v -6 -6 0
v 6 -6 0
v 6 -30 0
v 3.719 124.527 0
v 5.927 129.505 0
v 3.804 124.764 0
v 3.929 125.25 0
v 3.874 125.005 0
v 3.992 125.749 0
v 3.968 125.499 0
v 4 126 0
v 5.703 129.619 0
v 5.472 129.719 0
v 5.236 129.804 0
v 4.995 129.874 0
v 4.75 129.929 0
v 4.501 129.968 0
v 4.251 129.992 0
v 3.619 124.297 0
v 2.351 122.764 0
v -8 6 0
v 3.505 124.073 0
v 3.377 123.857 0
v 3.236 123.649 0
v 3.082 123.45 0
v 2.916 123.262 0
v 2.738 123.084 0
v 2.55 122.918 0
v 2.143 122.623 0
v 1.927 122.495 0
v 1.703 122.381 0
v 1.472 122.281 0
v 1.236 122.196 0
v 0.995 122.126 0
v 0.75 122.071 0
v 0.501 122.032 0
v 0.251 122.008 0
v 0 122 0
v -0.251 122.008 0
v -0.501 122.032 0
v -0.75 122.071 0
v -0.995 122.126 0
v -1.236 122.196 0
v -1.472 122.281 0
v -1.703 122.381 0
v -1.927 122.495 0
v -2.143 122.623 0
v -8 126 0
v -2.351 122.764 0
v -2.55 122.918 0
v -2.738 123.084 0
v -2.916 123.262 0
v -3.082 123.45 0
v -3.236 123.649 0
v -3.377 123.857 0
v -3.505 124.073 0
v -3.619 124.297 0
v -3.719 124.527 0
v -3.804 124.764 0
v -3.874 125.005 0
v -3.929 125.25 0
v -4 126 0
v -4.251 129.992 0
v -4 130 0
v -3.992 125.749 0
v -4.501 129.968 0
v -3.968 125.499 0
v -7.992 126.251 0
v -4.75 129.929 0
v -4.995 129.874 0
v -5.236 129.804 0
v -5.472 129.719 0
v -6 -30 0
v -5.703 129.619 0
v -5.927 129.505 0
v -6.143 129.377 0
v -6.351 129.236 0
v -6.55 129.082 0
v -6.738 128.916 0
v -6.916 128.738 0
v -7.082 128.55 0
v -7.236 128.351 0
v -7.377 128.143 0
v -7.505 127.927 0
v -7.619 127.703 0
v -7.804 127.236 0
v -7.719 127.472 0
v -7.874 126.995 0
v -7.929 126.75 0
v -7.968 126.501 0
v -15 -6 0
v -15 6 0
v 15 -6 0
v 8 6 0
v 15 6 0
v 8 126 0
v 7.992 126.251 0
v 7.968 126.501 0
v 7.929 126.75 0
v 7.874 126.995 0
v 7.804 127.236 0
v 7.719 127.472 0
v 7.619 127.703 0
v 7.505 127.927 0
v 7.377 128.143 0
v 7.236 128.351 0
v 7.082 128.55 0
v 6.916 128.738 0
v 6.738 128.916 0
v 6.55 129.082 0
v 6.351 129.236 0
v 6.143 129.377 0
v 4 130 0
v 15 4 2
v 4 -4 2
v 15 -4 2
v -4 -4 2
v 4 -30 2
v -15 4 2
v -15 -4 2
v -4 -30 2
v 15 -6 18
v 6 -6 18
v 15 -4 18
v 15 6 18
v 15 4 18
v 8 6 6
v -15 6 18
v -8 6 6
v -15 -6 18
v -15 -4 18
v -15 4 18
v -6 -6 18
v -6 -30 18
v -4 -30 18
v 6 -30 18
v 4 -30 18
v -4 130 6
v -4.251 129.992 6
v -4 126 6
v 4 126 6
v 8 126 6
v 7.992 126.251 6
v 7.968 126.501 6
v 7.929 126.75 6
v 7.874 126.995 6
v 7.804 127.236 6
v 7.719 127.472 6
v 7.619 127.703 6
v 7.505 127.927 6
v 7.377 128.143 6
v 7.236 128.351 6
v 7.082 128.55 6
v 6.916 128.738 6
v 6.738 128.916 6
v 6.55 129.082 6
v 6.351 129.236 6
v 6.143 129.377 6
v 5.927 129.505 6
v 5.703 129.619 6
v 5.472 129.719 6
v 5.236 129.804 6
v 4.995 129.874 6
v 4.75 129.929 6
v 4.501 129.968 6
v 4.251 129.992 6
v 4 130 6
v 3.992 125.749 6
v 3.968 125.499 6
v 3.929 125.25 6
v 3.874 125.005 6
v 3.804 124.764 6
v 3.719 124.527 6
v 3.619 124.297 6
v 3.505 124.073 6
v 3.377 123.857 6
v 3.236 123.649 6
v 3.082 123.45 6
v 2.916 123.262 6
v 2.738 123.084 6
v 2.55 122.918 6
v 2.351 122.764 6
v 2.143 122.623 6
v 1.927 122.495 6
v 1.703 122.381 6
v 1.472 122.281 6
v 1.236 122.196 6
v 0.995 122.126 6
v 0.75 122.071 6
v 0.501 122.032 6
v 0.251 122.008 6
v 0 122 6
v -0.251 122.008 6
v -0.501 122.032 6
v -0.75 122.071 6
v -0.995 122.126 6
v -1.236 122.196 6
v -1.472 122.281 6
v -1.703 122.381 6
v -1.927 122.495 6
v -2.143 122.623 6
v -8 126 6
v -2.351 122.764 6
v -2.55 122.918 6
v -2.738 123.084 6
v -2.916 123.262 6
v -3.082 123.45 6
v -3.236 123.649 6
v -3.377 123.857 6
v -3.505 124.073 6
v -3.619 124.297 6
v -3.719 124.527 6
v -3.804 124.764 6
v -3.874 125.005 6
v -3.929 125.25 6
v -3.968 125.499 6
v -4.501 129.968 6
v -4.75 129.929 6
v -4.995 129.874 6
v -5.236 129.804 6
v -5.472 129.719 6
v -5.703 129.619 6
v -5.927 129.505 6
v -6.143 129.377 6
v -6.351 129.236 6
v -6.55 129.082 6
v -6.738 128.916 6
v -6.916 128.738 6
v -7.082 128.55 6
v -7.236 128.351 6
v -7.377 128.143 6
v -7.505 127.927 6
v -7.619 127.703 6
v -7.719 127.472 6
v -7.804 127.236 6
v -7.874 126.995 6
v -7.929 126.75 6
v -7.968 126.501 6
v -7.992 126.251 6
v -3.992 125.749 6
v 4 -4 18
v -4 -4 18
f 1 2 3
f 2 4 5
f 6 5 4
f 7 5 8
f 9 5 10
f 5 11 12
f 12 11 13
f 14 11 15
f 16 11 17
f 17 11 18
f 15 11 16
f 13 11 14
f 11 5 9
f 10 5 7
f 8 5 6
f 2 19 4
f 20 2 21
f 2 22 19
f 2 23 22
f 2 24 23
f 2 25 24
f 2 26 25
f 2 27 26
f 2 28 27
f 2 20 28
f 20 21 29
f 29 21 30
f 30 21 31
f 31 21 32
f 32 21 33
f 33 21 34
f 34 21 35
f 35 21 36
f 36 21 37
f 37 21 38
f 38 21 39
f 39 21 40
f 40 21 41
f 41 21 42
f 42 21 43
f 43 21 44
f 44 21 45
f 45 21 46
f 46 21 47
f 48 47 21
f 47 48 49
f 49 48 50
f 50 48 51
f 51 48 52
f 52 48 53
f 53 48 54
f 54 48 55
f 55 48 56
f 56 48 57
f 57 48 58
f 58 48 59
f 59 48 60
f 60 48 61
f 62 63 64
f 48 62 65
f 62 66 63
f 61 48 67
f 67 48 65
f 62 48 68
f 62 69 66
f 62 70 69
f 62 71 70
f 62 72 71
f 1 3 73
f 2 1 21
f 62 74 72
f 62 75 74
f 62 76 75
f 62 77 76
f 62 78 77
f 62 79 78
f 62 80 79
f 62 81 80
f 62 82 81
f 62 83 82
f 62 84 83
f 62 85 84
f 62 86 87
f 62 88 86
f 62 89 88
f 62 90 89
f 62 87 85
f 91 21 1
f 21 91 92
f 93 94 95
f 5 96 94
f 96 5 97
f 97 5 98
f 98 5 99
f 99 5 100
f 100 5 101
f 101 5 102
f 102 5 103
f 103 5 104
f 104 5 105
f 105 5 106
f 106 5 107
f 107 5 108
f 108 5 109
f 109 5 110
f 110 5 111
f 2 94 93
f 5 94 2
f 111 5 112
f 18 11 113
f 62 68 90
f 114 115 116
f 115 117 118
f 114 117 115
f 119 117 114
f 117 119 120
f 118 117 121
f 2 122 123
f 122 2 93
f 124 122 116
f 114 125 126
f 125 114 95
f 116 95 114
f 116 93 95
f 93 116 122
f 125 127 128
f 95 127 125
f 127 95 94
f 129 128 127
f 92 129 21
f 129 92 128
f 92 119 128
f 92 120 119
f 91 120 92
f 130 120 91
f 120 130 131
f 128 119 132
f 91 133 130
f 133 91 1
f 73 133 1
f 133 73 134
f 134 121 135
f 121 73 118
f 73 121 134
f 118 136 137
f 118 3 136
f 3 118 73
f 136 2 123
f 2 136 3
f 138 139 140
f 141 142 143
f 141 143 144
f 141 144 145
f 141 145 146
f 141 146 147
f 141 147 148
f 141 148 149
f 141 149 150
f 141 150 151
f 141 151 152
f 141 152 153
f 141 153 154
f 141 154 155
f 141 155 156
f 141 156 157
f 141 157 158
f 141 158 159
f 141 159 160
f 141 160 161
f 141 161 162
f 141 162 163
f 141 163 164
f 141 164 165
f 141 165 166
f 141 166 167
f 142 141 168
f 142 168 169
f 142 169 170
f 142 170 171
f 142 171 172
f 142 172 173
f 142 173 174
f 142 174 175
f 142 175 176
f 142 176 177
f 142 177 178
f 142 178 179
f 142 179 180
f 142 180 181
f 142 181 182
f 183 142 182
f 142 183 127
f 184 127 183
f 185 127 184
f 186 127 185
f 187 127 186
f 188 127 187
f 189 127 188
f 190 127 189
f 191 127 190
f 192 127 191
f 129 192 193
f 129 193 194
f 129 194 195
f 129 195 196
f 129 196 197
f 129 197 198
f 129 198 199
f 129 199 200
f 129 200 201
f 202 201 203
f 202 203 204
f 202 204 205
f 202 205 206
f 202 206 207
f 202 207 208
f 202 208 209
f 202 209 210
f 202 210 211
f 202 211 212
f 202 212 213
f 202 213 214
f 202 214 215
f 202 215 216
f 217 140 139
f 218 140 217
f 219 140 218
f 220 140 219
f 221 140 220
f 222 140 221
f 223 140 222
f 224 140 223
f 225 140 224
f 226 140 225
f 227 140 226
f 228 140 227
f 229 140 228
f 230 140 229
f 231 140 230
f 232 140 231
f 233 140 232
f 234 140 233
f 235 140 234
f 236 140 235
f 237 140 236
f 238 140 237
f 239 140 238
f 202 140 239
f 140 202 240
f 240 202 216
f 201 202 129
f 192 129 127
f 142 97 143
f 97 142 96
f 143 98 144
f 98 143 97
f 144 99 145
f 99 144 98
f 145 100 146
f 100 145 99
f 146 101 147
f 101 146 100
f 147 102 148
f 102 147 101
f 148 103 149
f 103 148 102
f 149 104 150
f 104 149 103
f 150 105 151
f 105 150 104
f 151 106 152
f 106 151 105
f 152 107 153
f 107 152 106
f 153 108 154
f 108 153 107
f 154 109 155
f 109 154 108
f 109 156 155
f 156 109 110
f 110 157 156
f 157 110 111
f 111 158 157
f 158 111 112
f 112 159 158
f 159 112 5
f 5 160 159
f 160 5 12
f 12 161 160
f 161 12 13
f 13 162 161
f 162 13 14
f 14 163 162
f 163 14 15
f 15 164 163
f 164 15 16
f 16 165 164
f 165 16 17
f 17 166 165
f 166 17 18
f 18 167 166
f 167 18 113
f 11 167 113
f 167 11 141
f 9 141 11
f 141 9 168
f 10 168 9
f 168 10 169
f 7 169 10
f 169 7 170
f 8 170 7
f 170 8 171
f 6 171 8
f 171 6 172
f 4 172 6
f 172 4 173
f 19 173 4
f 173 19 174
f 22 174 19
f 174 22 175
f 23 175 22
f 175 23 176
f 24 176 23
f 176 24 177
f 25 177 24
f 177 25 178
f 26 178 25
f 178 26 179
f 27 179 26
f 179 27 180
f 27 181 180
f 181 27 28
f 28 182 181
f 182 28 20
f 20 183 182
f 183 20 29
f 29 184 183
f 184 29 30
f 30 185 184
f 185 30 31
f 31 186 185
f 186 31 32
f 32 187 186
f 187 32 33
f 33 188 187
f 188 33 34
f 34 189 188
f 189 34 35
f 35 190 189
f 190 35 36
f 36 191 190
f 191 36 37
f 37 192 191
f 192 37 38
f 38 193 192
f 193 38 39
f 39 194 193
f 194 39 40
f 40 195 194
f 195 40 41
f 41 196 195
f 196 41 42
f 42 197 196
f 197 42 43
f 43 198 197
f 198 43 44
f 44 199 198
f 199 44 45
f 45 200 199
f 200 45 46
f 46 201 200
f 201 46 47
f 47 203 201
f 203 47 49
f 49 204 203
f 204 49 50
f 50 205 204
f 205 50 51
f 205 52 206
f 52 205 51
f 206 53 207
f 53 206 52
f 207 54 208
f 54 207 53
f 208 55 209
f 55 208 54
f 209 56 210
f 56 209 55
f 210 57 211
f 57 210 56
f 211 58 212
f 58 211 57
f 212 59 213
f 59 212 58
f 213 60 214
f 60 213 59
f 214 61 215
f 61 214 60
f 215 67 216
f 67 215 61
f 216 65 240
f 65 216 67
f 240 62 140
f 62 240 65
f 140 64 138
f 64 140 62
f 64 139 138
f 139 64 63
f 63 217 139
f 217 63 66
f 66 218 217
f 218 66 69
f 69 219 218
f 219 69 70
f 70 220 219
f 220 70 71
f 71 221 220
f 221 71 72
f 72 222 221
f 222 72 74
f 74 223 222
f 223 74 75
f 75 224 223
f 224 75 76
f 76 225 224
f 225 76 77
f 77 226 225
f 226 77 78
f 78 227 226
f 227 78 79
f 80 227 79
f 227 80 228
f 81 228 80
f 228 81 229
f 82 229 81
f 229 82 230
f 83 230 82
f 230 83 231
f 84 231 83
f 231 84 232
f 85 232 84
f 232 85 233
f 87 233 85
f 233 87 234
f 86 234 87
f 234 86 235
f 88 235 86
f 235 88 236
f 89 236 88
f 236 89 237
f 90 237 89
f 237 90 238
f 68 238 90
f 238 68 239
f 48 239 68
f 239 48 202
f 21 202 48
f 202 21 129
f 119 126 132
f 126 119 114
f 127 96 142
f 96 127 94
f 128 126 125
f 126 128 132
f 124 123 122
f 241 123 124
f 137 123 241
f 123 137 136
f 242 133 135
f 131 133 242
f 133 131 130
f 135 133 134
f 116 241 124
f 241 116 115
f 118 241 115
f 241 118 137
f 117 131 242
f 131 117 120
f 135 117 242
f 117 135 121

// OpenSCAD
plexi = 8;
walls = 2;
walls_support = 1.5;
bottom = 30;
side_width = 15;
hole_diameter = 8;
/* top_width = plexi + 2*walls; */
top_width = hole_diameter + 8;
height = 130;
thickness = 4;
depth = 18;
/* depth = 30; */
supports = height - 12;
column = 6;
$fn = 100;

module column() {
  difference() {
    translate([-(top_width - hole_diameter)/2, 0]) {
      minkowski() {
        circle(d = top_width - hole_diameter);
        square([top_width - hole_diameter, height - hole_diameter/2]);
      }
    }
    translate([0, height - hole_diameter/2]) {
      circle(d = hole_diameter);
    }
    translate([0, height]) {
      square([hole_diameter, hole_diameter], center = true);
    }
    rotate(180) {
      translate([-500, -plexi/2]) {
        square([1000, 1000]);
      }
    }
  }
}

module plate() {
  square([2*side_width, plexi + 2*walls], center = true);
  translate([0, -bottom/2]) {
    square([plexi + 2*walls, bottom], center = true);
  }
}

module walls_half() {
  translate([0, plexi/2]) {
    square([side_width, walls]);
  }
  translate([plexi - walls, -plexi/2 - walls]) {
    square([side_width + walls - plexi, walls]);
  }
  translate([plexi/2, -bottom]) {
    square([walls, bottom - plexi/2]);
  }
}

module supports_half() {
  translate([top_width/2, plexi/2 + walls, walls]) {
    rotate([0, -90, 0]) {
      linear_extrude(height = walls_support) {
        polygon([[0, 0], [depth - walls, 0], [0, supports]]);
      }
    }
  }
}

module supports() {
  supports_half();
  mirror() supports_half();
}

module walls() {
  walls_half();
  mirror() walls_half();
}

module outer() {
  color("red") linear_extrude(height = walls) plate();
  color("yellow") linear_extrude(height = column) column();
  color("blue") linear_extrude(height = depth) walls();
  /* color("yellow") supports(); */
}

module inter() {
  color("red") linear_extrude(height = walls) {
    difference() {
      plate();
      translate([top_width/2, -walls - plexi/2 - 1]) {
        square([side_width, 2*walls + plexi + 2]);
      }
      translate([-plexi/2, -bottom]) {
        square([plexi, bottom + plexi/2]);
      }
    }
  }
  color("yellow") linear_extrude(height = column) column();
  color("blue") linear_extrude(height = depth) {
    mirror() walls_half();
    translate([0, plexi/2]) {
      square([top_width/2, walls]);
    }
    translate([plexi/2, -bottom]) {
      square([walls, bottom + plexi/2]);
    }
  }
}

outer();
/* inter(); */
